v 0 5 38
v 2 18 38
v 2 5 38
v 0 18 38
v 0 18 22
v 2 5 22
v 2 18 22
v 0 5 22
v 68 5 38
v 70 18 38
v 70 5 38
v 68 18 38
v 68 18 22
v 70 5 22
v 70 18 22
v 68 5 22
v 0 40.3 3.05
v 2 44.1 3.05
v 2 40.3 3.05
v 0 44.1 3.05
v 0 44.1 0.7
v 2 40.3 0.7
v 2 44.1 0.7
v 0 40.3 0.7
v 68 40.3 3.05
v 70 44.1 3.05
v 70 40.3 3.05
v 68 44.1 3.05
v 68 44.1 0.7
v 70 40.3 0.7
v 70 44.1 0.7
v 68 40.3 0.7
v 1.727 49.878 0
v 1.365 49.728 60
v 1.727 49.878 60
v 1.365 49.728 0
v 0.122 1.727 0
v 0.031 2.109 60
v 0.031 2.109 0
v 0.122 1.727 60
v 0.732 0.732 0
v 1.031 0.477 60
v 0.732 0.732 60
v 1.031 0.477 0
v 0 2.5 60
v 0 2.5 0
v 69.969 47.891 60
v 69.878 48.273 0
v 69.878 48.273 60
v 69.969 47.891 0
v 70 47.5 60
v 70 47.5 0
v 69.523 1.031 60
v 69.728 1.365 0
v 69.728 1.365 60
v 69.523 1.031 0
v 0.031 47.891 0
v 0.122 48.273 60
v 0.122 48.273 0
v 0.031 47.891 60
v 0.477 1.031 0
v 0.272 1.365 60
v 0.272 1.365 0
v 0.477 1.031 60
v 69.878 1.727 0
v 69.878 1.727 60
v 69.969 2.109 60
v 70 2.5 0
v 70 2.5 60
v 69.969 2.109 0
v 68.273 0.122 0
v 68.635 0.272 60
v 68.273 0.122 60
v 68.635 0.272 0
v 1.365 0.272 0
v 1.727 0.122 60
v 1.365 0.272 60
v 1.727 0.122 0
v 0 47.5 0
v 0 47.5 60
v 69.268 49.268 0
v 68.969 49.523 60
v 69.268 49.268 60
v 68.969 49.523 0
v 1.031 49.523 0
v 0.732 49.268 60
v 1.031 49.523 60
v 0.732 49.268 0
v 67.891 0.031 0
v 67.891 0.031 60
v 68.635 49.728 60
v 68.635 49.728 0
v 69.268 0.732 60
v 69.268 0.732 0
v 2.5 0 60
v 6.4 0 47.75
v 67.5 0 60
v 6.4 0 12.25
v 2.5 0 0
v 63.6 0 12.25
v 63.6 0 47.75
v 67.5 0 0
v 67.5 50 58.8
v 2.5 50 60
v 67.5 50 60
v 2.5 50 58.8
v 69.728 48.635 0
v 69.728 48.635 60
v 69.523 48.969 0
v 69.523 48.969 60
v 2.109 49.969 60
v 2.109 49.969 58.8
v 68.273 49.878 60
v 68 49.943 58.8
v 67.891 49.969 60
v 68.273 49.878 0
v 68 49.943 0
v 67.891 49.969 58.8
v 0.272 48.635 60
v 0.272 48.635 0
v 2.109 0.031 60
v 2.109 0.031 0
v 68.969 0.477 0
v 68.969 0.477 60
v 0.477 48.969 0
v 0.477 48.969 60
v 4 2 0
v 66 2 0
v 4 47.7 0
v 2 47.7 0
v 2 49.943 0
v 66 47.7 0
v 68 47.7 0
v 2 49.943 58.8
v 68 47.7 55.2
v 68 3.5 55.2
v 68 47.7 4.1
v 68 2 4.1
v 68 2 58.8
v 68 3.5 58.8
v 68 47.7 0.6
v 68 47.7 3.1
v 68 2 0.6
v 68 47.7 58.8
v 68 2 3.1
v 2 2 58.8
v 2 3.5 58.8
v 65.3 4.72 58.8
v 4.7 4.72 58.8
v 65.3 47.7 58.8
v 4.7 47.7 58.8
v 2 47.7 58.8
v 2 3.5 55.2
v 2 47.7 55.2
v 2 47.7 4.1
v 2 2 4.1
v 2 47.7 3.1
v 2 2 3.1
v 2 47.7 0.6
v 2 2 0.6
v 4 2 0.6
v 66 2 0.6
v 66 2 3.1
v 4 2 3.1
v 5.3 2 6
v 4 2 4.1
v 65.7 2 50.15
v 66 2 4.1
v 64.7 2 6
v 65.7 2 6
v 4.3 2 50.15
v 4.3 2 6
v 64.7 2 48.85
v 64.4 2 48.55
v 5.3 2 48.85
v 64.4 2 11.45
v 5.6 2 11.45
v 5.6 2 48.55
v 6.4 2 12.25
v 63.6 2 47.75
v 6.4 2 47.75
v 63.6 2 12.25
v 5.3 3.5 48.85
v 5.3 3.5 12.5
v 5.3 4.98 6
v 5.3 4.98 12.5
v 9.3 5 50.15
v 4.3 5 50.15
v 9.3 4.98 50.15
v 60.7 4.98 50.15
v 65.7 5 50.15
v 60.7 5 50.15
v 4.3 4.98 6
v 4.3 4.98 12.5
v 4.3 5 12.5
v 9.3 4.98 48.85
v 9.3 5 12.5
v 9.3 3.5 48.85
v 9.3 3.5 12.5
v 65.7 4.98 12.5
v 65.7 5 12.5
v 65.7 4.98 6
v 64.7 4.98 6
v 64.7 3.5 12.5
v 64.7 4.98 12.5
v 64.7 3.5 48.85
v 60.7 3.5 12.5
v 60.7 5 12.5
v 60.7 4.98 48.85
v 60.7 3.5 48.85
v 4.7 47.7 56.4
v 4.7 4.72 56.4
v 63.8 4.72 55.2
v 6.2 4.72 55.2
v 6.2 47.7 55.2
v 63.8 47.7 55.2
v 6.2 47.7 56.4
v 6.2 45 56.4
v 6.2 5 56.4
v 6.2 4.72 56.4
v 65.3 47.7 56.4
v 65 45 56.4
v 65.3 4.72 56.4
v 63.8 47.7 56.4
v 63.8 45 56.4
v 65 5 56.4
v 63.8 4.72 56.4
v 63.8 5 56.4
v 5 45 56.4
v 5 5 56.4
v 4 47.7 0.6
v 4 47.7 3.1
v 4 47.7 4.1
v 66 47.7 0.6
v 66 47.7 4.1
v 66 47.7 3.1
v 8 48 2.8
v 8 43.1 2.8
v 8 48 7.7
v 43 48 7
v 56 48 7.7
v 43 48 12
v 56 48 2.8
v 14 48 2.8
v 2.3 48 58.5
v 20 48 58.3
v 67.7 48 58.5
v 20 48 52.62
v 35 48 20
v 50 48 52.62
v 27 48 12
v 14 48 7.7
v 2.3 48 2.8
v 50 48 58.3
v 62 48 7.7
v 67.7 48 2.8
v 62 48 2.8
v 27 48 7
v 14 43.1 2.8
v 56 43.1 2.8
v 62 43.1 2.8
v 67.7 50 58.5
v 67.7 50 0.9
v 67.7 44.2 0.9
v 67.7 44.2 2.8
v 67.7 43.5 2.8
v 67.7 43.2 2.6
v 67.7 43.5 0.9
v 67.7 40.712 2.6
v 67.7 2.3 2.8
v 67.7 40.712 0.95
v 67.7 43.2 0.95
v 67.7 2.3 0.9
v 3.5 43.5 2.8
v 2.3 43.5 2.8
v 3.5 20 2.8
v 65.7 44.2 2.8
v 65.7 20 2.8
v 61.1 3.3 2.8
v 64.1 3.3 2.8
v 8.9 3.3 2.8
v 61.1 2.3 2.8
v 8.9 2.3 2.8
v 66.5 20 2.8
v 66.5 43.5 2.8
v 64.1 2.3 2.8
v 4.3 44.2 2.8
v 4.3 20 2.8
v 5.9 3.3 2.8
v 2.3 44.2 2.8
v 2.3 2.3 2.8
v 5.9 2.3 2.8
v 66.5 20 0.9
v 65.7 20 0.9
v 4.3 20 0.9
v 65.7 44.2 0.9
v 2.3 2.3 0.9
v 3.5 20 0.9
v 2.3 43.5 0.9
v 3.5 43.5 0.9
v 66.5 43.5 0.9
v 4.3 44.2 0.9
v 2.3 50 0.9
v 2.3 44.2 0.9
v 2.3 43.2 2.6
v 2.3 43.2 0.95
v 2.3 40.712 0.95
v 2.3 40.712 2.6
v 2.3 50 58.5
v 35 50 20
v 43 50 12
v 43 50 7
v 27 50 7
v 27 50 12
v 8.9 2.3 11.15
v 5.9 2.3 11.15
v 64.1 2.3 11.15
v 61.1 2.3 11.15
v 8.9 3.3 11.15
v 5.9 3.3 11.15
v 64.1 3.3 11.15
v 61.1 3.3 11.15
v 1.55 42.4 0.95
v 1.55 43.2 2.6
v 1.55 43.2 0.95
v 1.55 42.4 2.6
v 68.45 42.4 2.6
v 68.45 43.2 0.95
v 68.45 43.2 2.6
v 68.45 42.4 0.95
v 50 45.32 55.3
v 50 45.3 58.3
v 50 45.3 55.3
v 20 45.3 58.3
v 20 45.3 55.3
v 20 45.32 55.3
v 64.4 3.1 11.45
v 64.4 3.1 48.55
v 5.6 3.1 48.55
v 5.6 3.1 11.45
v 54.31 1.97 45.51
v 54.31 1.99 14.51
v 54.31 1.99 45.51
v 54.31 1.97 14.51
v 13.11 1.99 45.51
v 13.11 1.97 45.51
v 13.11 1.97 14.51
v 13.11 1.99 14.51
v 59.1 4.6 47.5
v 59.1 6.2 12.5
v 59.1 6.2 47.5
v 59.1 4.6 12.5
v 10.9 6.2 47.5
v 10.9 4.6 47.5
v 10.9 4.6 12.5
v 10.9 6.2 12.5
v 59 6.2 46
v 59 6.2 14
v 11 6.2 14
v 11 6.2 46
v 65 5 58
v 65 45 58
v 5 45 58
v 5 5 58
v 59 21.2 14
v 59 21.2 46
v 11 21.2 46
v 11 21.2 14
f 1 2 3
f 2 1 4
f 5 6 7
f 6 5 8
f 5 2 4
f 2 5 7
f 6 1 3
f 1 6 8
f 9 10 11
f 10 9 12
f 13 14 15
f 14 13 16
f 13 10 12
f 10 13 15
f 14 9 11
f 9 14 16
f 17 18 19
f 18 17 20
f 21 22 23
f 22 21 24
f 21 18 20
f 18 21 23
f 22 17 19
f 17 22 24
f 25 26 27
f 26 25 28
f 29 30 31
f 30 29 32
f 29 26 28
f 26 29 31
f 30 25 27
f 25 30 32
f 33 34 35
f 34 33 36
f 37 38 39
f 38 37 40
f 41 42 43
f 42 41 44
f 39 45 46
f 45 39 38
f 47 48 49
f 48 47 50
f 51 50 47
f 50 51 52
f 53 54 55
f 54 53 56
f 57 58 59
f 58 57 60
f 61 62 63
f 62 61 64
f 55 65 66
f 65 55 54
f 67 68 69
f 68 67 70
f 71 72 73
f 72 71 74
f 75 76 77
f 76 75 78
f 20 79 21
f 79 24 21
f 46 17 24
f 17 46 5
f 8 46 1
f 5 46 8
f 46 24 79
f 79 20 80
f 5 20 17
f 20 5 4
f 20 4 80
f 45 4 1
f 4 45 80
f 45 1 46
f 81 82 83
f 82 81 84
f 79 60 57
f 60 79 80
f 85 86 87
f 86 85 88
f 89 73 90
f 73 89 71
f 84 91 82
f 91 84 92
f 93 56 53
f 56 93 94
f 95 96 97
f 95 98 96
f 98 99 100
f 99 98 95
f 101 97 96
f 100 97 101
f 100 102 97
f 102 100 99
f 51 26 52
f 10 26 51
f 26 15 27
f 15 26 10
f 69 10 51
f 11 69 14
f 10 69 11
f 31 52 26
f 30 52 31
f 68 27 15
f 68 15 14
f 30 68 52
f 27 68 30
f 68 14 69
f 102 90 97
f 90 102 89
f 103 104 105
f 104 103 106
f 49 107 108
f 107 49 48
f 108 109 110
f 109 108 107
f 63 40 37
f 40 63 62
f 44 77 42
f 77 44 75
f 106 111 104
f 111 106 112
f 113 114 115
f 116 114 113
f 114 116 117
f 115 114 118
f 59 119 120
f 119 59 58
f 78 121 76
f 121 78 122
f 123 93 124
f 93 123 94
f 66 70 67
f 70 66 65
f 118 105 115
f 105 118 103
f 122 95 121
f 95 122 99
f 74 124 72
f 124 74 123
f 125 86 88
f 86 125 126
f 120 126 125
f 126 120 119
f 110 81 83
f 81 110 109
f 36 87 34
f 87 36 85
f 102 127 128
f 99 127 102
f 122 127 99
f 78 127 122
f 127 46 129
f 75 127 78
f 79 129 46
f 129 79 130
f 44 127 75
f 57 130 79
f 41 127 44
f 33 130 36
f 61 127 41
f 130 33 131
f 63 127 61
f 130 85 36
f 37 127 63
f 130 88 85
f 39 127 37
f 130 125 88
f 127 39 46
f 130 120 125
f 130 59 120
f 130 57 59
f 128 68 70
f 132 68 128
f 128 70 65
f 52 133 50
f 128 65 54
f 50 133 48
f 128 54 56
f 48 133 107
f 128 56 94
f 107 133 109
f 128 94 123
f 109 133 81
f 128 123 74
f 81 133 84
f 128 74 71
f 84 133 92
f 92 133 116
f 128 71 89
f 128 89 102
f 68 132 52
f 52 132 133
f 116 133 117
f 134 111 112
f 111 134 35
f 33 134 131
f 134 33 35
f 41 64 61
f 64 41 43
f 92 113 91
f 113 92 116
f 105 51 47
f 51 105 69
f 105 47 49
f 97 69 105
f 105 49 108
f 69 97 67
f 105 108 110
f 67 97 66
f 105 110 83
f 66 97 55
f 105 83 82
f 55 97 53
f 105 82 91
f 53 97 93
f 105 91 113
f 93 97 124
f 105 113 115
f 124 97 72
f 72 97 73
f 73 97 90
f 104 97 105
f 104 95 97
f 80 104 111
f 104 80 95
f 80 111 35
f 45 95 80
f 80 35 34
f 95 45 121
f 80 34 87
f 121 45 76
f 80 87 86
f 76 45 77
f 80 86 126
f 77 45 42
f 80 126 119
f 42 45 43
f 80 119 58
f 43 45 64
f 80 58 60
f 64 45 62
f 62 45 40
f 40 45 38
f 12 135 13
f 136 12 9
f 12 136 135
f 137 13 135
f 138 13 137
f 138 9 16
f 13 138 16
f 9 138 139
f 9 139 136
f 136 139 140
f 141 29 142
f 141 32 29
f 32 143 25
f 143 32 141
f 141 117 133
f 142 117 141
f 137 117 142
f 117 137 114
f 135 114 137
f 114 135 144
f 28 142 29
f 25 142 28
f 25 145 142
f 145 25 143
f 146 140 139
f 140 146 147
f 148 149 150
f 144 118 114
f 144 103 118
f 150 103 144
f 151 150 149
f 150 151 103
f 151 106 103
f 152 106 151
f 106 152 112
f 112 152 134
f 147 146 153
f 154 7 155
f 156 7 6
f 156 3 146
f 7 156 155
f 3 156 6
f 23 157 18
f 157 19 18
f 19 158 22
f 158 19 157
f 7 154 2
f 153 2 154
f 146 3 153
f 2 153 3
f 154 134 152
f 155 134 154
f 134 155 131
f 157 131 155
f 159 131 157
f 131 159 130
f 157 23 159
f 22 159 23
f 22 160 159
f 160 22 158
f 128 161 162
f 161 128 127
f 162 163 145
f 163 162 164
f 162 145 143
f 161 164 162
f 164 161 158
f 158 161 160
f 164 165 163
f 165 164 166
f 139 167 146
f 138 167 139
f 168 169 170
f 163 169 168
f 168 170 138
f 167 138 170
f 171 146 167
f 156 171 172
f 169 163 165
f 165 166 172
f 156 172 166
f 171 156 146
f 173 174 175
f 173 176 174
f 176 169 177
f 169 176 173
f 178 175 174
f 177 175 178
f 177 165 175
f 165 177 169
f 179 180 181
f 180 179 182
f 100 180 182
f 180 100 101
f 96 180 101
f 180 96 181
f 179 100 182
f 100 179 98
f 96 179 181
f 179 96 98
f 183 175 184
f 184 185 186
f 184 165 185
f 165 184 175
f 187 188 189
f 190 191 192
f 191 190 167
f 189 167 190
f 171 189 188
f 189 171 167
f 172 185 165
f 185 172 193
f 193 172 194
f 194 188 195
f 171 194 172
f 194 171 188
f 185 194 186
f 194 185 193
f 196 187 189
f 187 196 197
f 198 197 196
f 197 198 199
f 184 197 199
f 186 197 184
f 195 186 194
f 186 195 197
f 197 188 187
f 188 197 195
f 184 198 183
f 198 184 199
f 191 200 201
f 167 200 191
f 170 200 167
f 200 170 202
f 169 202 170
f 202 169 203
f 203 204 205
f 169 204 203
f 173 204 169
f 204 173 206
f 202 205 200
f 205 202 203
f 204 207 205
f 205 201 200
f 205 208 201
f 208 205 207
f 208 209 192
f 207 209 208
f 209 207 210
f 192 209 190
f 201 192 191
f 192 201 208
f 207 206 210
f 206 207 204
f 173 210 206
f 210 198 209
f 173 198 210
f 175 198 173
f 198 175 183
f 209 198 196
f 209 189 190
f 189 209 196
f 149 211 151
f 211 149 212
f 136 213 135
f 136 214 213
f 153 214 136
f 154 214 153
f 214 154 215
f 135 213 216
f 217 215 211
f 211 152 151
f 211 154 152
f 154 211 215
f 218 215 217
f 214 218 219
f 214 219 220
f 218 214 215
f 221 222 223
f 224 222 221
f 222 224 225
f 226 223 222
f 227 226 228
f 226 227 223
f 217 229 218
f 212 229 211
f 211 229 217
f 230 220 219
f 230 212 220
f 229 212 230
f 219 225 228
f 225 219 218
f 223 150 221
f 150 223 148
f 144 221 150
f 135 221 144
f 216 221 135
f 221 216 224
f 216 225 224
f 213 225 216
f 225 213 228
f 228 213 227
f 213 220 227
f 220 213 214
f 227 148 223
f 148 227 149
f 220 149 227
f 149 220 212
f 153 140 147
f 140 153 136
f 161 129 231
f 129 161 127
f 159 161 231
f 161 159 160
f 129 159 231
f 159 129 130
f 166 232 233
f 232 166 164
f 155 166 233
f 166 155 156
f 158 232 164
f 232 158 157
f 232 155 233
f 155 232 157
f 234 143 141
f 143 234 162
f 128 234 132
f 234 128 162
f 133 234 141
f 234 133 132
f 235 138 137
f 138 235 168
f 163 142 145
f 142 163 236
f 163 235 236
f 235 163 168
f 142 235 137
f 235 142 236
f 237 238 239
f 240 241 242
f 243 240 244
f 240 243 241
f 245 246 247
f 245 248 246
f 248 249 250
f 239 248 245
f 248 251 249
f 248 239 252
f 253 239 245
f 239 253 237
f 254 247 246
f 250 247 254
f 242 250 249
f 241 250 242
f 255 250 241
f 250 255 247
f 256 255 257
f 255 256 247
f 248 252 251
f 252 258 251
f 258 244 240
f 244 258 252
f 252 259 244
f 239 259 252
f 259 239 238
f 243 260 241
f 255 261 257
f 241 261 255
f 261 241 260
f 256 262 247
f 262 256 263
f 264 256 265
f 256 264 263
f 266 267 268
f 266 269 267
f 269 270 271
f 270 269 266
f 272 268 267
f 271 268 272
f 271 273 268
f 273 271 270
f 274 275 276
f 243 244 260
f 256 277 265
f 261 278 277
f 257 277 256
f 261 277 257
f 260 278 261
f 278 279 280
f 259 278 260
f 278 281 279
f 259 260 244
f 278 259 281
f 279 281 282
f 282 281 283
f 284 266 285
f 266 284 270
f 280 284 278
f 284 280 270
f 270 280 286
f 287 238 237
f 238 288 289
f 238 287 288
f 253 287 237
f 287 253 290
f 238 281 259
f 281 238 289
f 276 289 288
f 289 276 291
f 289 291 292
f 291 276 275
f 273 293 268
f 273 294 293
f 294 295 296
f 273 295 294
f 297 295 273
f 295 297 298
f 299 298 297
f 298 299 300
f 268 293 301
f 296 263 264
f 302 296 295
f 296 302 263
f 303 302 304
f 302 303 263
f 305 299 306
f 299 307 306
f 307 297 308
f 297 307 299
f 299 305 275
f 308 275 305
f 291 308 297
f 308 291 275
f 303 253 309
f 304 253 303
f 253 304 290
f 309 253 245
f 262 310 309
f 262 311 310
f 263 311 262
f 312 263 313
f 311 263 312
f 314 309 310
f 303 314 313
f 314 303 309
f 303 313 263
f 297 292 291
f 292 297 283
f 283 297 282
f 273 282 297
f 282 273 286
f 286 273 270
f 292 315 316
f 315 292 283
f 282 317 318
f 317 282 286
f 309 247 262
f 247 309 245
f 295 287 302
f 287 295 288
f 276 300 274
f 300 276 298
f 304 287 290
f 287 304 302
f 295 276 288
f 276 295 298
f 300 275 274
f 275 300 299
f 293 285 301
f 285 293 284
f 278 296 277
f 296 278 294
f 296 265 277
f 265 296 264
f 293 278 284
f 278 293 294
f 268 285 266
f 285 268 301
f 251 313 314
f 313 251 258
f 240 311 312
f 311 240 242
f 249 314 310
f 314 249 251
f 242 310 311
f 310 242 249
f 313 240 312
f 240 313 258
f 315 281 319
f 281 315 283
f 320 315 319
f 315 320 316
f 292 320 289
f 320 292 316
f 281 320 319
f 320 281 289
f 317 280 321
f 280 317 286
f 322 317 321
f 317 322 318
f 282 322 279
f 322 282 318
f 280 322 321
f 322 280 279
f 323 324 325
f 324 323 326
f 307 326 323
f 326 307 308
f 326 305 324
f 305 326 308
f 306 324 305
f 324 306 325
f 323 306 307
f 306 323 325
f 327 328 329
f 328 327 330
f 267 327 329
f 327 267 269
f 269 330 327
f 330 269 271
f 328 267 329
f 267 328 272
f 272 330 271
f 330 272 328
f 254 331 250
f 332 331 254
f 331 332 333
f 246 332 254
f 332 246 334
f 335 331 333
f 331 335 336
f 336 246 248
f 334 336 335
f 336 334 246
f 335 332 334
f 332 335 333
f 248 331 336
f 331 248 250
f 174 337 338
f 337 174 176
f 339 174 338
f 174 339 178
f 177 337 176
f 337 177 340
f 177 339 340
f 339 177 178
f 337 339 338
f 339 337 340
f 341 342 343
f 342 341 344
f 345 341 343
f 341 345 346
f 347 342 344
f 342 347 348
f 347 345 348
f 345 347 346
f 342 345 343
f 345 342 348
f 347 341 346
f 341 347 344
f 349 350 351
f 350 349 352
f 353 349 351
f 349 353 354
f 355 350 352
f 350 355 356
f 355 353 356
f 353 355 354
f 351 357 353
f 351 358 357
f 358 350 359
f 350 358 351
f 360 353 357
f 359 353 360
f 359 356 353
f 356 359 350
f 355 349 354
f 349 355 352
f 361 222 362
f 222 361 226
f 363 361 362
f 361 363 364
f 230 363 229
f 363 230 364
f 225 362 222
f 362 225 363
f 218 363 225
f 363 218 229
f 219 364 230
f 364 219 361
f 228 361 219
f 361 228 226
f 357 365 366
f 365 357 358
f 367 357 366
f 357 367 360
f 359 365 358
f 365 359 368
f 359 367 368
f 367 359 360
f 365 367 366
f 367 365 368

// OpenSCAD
// NFC jukebox enclosure rA - millimetres.
// Source: Waveshare ESP32-S3-Touch-LCD-2 dimension drawing.
// RC522 nominal 60x40 PCB; actual thickness/component keepouts need fit check.
// Coordinates: X width, Y front->rear, Z height. Front is Y=0.
// Use: openscad -D 'part="body"' -o body.stl jukebox.scad
part = "assembly"; // body, drawer, assembly, exploded, interference
$fn = 40;
W=70; D=50; H=60;
wall=2;
glass_w=58.8; glass_h=37.1; glass_t=1.1;
glass_x=(W-glass_w)/2; glass_z=(H-glass_h)/2;
glass_y=wall;
glass_gap=0.4;
rail_rear=glass_y+glass_t+glass_gap;
rc_w=60; rc_d=40; rc_t=1.6;
rc_x=(W-rc_w)/2; rc_y=(D-rc_d)/2;
rc_z=56.4;
clearance=0.3;
eps=0.02;

module box(x,y,z,dx,dy,dz){translate([x,y,z])cube([dx,dy,dz]);}

module shell(){
  difference(){
    linear_extrude(height=H)hull()
      for(x=[2.5,W-2.5],y=[2.5,D-2.5])translate([x,y])circle(r=2.5);
    // Open bottom and rear, roof 1.2 mm. Side/front walls 2 mm.
    box(wall,wall,-eps,W-2*wall,D,H-1.2+eps);
    // Front bezel overlaps glass by 0.8 mm each edge.
    box(glass_x+0.8,-eps,glass_z+0.8,glass_w-1.6,wall+2*eps,glass_h-1.6);
    // Side service windows accommodate either mirrored USB orientation.
    for(x=[-eps,W-wall-eps]) box(x,5,22,wall+2*eps,13,16);
    // Release openings for the two drawer detents, accessible from outside.
    for(x=[-eps,W-wall-eps]) box(x,40.3,0.7,wall+2*eps,3.8,2.35);
  }
}

module display_guides(){
  // Retain only glass margins: rear PCB is narrower and stays unobstructed.
  for(right=[false,true]){
    x=right ? glass_x+glass_w+clearance : glass_x-clearance-1;
    box(x,wall-eps,6,1,3.0,H/2+glass_h/2+clearance-6+1.3);
    xr=right ? glass_x+glass_w-3.7 : glass_x-clearance-1;
    // Bottom clearance lets drawer support fingers slide underneath the rails.
    box(xr,rail_rear,glass_z+1.05,5,1.5,glass_h+clearance+1.3-1.05);
  }
  // Upper stop contacts the outer glass edge, not active LCD.
  box(glass_x-clearance,wall-eps,glass_z+glass_h+clearance,
      glass_w+2*clearance,rail_rear-wall+1.5,1.3);
}

module rfid_guides(){
  // Board slides in from the open rear, antenna side up, solder joints down.
  // 2.4-mm channel for nominal 1.6-mm PCB. No metal or supports under antenna.
  for(right=[false,true]){
    x=right ? rc_x+rc_w+clearance : wall-eps;
    width=right ? W-wall-x+eps : rc_x-clearance-wall+eps;
    box(x,rc_y-clearance,55.2,width,D-wall-clearance-(rc_y-clearance),H-1.2-55.2+eps);
    ledge_x=right ? rc_x+rc_w-1.2 : wall-eps;
    ledge_w=right ? W-wall-ledge_x+eps : rc_x+1.2-wall+eps;
    box(ledge_x,rc_y-clearance,55.2,ledge_w,D-wall-clearance-(rc_y-clearance),1.2);
  }
  box(wall-eps,rc_y-clearance-1.2,55.2,W-2*wall+2*eps,1.2+eps,H-1.2-55.2+eps);
}

module floor_guides(){
  for(right=[false,true]){
    x=right ? W-wall-2 : wall-eps;
    box(x,wall-eps,0,2+eps,D-2*wall-clearance+eps,0.6);
    box(x,wall-eps,3.1,2+eps,D-2*wall-clearance+eps,1.0);
  }
}

module body(){union(){shell();display_guides();rfid_guides();floor_guides();}}

module tooth_left(){
  // 0.45 mm engagement, 24-mm flexible PLA arm, ramp during insertion.
  translate([0,0,0.95])linear_extrude(height=1.65)
    polygon([[2.35,40.6],[1.55,42.4],[1.55,43.2],[2.35,43.2]]);
}

module drawer(){
  union(){
    difference(){
      union(){
        box(2.3,2.3,0.9,W-4.6,D-2.3,1.9);
        box(2.3,48,0.9,W-4.6,2,57.6);
        // Inner corner fillet substitute: 45-degree triangular gussets.
        for(x=[8,56])translate([x,48,2.7])rotate([90,0,90])
          linear_extrude(height=6)polygon([[0,0],[-5,0],[0,5]]);
      }
      // Free a long cantilever on each side, rooted at Y=20.
      box(3.5,20,0.8,0.8,24.2,2.2);
      box(2.1,43.5,0.8,2.2,0.7,2.2);
      box(W-4.3,20,0.8,0.8,24.2,2.2);
      box(W-4.3,43.5,0.8,2.2,0.7,2.2);
      // Grip opening with a 45-degree roof instead of a 16-mm bridge.
      translate([27,50.1,7])rotate([90,0,0])linear_extrude(height=2.2)
        polygon([[0,0],[16,0],[16,5],[8,13],[0,5]]);
    }
    tooth_left();translate([W,0,0])mirror([1,0,0])tooth_left();
    // Drawer supports display glass vertically, with 0.3 mm end clearance.
    for(x=[glass_x+0.3,glass_x+glass_w-3.3])
      box(x,2.3,2.7,3,1.0,glass_z-clearance-2.7);
    // Rear board stop: only its end face, no pressure on PCB surfaces.
    box(20,rc_y+rc_d+clearance,55.3,30,48-(rc_y+rc_d+clearance)+eps,3.0);
    // Grow the overhang outward from the rear wall at 45 degrees.
    translate([20,48,52.6])rotate([90,0,90])linear_extrude(height=30)
      polygon([[eps,0],[eps,2.72],[-2.7,2.72]]);
  }
}

module hardware(){
  color([0.12,0.16,0.19])box(glass_x,glass_y,glass_z,glass_w,glass_t,glass_h);
  color([0.08,0.65,0.64])box(glass_x+7.51,glass_y-0.03,glass_z+3.06,41.2,0.02,31);
  // PCB envelope; actual connector positions are deliberately not asserted.
  color([0.1,0.3,0.6])box((W-48.2)/2,glass_y+glass_t+1.5,(H-35)/2,48.2,1.6,35);
  color([0.08,0.35,0.62])box(rc_x,rc_y,rc_z,rc_w,rc_d,rc_t);
  // Approximate rear electronics keepout, for illustration only.
  color([0.55,0.55,0.55,0.3])box(11,6.2,14,48,15,32);
}

if(part=="body") translate([0,D,H])rotate([180,0,0])body();
else if(part=="drawer")translate([0,0,-0.9])drawer();
else if(part=="interference")intersection(){body();drawer();}
else if(part=="travel_check")intersection(){
  body();
  union()for(dy=[0:0.5:50])translate([0,dy,0])difference(){
    drawer();
    // The flexible detents intentionally interfere while the drawer slides.
    box(0,39,0,2.3,6,4);box(W-2.3,39,0,2.3,6,4);
  }
}
else if(part=="exploded"){
  color([0.76,0.80,0.83,0.5])body();hardware();
  color([0.94,0.55,0.22])translate([0,35,-10])drawer();
} else {
  color([0.76,0.80,0.83,0.65])body();
  color([0.3,0.36,0.42])drawer();hardware();
}
